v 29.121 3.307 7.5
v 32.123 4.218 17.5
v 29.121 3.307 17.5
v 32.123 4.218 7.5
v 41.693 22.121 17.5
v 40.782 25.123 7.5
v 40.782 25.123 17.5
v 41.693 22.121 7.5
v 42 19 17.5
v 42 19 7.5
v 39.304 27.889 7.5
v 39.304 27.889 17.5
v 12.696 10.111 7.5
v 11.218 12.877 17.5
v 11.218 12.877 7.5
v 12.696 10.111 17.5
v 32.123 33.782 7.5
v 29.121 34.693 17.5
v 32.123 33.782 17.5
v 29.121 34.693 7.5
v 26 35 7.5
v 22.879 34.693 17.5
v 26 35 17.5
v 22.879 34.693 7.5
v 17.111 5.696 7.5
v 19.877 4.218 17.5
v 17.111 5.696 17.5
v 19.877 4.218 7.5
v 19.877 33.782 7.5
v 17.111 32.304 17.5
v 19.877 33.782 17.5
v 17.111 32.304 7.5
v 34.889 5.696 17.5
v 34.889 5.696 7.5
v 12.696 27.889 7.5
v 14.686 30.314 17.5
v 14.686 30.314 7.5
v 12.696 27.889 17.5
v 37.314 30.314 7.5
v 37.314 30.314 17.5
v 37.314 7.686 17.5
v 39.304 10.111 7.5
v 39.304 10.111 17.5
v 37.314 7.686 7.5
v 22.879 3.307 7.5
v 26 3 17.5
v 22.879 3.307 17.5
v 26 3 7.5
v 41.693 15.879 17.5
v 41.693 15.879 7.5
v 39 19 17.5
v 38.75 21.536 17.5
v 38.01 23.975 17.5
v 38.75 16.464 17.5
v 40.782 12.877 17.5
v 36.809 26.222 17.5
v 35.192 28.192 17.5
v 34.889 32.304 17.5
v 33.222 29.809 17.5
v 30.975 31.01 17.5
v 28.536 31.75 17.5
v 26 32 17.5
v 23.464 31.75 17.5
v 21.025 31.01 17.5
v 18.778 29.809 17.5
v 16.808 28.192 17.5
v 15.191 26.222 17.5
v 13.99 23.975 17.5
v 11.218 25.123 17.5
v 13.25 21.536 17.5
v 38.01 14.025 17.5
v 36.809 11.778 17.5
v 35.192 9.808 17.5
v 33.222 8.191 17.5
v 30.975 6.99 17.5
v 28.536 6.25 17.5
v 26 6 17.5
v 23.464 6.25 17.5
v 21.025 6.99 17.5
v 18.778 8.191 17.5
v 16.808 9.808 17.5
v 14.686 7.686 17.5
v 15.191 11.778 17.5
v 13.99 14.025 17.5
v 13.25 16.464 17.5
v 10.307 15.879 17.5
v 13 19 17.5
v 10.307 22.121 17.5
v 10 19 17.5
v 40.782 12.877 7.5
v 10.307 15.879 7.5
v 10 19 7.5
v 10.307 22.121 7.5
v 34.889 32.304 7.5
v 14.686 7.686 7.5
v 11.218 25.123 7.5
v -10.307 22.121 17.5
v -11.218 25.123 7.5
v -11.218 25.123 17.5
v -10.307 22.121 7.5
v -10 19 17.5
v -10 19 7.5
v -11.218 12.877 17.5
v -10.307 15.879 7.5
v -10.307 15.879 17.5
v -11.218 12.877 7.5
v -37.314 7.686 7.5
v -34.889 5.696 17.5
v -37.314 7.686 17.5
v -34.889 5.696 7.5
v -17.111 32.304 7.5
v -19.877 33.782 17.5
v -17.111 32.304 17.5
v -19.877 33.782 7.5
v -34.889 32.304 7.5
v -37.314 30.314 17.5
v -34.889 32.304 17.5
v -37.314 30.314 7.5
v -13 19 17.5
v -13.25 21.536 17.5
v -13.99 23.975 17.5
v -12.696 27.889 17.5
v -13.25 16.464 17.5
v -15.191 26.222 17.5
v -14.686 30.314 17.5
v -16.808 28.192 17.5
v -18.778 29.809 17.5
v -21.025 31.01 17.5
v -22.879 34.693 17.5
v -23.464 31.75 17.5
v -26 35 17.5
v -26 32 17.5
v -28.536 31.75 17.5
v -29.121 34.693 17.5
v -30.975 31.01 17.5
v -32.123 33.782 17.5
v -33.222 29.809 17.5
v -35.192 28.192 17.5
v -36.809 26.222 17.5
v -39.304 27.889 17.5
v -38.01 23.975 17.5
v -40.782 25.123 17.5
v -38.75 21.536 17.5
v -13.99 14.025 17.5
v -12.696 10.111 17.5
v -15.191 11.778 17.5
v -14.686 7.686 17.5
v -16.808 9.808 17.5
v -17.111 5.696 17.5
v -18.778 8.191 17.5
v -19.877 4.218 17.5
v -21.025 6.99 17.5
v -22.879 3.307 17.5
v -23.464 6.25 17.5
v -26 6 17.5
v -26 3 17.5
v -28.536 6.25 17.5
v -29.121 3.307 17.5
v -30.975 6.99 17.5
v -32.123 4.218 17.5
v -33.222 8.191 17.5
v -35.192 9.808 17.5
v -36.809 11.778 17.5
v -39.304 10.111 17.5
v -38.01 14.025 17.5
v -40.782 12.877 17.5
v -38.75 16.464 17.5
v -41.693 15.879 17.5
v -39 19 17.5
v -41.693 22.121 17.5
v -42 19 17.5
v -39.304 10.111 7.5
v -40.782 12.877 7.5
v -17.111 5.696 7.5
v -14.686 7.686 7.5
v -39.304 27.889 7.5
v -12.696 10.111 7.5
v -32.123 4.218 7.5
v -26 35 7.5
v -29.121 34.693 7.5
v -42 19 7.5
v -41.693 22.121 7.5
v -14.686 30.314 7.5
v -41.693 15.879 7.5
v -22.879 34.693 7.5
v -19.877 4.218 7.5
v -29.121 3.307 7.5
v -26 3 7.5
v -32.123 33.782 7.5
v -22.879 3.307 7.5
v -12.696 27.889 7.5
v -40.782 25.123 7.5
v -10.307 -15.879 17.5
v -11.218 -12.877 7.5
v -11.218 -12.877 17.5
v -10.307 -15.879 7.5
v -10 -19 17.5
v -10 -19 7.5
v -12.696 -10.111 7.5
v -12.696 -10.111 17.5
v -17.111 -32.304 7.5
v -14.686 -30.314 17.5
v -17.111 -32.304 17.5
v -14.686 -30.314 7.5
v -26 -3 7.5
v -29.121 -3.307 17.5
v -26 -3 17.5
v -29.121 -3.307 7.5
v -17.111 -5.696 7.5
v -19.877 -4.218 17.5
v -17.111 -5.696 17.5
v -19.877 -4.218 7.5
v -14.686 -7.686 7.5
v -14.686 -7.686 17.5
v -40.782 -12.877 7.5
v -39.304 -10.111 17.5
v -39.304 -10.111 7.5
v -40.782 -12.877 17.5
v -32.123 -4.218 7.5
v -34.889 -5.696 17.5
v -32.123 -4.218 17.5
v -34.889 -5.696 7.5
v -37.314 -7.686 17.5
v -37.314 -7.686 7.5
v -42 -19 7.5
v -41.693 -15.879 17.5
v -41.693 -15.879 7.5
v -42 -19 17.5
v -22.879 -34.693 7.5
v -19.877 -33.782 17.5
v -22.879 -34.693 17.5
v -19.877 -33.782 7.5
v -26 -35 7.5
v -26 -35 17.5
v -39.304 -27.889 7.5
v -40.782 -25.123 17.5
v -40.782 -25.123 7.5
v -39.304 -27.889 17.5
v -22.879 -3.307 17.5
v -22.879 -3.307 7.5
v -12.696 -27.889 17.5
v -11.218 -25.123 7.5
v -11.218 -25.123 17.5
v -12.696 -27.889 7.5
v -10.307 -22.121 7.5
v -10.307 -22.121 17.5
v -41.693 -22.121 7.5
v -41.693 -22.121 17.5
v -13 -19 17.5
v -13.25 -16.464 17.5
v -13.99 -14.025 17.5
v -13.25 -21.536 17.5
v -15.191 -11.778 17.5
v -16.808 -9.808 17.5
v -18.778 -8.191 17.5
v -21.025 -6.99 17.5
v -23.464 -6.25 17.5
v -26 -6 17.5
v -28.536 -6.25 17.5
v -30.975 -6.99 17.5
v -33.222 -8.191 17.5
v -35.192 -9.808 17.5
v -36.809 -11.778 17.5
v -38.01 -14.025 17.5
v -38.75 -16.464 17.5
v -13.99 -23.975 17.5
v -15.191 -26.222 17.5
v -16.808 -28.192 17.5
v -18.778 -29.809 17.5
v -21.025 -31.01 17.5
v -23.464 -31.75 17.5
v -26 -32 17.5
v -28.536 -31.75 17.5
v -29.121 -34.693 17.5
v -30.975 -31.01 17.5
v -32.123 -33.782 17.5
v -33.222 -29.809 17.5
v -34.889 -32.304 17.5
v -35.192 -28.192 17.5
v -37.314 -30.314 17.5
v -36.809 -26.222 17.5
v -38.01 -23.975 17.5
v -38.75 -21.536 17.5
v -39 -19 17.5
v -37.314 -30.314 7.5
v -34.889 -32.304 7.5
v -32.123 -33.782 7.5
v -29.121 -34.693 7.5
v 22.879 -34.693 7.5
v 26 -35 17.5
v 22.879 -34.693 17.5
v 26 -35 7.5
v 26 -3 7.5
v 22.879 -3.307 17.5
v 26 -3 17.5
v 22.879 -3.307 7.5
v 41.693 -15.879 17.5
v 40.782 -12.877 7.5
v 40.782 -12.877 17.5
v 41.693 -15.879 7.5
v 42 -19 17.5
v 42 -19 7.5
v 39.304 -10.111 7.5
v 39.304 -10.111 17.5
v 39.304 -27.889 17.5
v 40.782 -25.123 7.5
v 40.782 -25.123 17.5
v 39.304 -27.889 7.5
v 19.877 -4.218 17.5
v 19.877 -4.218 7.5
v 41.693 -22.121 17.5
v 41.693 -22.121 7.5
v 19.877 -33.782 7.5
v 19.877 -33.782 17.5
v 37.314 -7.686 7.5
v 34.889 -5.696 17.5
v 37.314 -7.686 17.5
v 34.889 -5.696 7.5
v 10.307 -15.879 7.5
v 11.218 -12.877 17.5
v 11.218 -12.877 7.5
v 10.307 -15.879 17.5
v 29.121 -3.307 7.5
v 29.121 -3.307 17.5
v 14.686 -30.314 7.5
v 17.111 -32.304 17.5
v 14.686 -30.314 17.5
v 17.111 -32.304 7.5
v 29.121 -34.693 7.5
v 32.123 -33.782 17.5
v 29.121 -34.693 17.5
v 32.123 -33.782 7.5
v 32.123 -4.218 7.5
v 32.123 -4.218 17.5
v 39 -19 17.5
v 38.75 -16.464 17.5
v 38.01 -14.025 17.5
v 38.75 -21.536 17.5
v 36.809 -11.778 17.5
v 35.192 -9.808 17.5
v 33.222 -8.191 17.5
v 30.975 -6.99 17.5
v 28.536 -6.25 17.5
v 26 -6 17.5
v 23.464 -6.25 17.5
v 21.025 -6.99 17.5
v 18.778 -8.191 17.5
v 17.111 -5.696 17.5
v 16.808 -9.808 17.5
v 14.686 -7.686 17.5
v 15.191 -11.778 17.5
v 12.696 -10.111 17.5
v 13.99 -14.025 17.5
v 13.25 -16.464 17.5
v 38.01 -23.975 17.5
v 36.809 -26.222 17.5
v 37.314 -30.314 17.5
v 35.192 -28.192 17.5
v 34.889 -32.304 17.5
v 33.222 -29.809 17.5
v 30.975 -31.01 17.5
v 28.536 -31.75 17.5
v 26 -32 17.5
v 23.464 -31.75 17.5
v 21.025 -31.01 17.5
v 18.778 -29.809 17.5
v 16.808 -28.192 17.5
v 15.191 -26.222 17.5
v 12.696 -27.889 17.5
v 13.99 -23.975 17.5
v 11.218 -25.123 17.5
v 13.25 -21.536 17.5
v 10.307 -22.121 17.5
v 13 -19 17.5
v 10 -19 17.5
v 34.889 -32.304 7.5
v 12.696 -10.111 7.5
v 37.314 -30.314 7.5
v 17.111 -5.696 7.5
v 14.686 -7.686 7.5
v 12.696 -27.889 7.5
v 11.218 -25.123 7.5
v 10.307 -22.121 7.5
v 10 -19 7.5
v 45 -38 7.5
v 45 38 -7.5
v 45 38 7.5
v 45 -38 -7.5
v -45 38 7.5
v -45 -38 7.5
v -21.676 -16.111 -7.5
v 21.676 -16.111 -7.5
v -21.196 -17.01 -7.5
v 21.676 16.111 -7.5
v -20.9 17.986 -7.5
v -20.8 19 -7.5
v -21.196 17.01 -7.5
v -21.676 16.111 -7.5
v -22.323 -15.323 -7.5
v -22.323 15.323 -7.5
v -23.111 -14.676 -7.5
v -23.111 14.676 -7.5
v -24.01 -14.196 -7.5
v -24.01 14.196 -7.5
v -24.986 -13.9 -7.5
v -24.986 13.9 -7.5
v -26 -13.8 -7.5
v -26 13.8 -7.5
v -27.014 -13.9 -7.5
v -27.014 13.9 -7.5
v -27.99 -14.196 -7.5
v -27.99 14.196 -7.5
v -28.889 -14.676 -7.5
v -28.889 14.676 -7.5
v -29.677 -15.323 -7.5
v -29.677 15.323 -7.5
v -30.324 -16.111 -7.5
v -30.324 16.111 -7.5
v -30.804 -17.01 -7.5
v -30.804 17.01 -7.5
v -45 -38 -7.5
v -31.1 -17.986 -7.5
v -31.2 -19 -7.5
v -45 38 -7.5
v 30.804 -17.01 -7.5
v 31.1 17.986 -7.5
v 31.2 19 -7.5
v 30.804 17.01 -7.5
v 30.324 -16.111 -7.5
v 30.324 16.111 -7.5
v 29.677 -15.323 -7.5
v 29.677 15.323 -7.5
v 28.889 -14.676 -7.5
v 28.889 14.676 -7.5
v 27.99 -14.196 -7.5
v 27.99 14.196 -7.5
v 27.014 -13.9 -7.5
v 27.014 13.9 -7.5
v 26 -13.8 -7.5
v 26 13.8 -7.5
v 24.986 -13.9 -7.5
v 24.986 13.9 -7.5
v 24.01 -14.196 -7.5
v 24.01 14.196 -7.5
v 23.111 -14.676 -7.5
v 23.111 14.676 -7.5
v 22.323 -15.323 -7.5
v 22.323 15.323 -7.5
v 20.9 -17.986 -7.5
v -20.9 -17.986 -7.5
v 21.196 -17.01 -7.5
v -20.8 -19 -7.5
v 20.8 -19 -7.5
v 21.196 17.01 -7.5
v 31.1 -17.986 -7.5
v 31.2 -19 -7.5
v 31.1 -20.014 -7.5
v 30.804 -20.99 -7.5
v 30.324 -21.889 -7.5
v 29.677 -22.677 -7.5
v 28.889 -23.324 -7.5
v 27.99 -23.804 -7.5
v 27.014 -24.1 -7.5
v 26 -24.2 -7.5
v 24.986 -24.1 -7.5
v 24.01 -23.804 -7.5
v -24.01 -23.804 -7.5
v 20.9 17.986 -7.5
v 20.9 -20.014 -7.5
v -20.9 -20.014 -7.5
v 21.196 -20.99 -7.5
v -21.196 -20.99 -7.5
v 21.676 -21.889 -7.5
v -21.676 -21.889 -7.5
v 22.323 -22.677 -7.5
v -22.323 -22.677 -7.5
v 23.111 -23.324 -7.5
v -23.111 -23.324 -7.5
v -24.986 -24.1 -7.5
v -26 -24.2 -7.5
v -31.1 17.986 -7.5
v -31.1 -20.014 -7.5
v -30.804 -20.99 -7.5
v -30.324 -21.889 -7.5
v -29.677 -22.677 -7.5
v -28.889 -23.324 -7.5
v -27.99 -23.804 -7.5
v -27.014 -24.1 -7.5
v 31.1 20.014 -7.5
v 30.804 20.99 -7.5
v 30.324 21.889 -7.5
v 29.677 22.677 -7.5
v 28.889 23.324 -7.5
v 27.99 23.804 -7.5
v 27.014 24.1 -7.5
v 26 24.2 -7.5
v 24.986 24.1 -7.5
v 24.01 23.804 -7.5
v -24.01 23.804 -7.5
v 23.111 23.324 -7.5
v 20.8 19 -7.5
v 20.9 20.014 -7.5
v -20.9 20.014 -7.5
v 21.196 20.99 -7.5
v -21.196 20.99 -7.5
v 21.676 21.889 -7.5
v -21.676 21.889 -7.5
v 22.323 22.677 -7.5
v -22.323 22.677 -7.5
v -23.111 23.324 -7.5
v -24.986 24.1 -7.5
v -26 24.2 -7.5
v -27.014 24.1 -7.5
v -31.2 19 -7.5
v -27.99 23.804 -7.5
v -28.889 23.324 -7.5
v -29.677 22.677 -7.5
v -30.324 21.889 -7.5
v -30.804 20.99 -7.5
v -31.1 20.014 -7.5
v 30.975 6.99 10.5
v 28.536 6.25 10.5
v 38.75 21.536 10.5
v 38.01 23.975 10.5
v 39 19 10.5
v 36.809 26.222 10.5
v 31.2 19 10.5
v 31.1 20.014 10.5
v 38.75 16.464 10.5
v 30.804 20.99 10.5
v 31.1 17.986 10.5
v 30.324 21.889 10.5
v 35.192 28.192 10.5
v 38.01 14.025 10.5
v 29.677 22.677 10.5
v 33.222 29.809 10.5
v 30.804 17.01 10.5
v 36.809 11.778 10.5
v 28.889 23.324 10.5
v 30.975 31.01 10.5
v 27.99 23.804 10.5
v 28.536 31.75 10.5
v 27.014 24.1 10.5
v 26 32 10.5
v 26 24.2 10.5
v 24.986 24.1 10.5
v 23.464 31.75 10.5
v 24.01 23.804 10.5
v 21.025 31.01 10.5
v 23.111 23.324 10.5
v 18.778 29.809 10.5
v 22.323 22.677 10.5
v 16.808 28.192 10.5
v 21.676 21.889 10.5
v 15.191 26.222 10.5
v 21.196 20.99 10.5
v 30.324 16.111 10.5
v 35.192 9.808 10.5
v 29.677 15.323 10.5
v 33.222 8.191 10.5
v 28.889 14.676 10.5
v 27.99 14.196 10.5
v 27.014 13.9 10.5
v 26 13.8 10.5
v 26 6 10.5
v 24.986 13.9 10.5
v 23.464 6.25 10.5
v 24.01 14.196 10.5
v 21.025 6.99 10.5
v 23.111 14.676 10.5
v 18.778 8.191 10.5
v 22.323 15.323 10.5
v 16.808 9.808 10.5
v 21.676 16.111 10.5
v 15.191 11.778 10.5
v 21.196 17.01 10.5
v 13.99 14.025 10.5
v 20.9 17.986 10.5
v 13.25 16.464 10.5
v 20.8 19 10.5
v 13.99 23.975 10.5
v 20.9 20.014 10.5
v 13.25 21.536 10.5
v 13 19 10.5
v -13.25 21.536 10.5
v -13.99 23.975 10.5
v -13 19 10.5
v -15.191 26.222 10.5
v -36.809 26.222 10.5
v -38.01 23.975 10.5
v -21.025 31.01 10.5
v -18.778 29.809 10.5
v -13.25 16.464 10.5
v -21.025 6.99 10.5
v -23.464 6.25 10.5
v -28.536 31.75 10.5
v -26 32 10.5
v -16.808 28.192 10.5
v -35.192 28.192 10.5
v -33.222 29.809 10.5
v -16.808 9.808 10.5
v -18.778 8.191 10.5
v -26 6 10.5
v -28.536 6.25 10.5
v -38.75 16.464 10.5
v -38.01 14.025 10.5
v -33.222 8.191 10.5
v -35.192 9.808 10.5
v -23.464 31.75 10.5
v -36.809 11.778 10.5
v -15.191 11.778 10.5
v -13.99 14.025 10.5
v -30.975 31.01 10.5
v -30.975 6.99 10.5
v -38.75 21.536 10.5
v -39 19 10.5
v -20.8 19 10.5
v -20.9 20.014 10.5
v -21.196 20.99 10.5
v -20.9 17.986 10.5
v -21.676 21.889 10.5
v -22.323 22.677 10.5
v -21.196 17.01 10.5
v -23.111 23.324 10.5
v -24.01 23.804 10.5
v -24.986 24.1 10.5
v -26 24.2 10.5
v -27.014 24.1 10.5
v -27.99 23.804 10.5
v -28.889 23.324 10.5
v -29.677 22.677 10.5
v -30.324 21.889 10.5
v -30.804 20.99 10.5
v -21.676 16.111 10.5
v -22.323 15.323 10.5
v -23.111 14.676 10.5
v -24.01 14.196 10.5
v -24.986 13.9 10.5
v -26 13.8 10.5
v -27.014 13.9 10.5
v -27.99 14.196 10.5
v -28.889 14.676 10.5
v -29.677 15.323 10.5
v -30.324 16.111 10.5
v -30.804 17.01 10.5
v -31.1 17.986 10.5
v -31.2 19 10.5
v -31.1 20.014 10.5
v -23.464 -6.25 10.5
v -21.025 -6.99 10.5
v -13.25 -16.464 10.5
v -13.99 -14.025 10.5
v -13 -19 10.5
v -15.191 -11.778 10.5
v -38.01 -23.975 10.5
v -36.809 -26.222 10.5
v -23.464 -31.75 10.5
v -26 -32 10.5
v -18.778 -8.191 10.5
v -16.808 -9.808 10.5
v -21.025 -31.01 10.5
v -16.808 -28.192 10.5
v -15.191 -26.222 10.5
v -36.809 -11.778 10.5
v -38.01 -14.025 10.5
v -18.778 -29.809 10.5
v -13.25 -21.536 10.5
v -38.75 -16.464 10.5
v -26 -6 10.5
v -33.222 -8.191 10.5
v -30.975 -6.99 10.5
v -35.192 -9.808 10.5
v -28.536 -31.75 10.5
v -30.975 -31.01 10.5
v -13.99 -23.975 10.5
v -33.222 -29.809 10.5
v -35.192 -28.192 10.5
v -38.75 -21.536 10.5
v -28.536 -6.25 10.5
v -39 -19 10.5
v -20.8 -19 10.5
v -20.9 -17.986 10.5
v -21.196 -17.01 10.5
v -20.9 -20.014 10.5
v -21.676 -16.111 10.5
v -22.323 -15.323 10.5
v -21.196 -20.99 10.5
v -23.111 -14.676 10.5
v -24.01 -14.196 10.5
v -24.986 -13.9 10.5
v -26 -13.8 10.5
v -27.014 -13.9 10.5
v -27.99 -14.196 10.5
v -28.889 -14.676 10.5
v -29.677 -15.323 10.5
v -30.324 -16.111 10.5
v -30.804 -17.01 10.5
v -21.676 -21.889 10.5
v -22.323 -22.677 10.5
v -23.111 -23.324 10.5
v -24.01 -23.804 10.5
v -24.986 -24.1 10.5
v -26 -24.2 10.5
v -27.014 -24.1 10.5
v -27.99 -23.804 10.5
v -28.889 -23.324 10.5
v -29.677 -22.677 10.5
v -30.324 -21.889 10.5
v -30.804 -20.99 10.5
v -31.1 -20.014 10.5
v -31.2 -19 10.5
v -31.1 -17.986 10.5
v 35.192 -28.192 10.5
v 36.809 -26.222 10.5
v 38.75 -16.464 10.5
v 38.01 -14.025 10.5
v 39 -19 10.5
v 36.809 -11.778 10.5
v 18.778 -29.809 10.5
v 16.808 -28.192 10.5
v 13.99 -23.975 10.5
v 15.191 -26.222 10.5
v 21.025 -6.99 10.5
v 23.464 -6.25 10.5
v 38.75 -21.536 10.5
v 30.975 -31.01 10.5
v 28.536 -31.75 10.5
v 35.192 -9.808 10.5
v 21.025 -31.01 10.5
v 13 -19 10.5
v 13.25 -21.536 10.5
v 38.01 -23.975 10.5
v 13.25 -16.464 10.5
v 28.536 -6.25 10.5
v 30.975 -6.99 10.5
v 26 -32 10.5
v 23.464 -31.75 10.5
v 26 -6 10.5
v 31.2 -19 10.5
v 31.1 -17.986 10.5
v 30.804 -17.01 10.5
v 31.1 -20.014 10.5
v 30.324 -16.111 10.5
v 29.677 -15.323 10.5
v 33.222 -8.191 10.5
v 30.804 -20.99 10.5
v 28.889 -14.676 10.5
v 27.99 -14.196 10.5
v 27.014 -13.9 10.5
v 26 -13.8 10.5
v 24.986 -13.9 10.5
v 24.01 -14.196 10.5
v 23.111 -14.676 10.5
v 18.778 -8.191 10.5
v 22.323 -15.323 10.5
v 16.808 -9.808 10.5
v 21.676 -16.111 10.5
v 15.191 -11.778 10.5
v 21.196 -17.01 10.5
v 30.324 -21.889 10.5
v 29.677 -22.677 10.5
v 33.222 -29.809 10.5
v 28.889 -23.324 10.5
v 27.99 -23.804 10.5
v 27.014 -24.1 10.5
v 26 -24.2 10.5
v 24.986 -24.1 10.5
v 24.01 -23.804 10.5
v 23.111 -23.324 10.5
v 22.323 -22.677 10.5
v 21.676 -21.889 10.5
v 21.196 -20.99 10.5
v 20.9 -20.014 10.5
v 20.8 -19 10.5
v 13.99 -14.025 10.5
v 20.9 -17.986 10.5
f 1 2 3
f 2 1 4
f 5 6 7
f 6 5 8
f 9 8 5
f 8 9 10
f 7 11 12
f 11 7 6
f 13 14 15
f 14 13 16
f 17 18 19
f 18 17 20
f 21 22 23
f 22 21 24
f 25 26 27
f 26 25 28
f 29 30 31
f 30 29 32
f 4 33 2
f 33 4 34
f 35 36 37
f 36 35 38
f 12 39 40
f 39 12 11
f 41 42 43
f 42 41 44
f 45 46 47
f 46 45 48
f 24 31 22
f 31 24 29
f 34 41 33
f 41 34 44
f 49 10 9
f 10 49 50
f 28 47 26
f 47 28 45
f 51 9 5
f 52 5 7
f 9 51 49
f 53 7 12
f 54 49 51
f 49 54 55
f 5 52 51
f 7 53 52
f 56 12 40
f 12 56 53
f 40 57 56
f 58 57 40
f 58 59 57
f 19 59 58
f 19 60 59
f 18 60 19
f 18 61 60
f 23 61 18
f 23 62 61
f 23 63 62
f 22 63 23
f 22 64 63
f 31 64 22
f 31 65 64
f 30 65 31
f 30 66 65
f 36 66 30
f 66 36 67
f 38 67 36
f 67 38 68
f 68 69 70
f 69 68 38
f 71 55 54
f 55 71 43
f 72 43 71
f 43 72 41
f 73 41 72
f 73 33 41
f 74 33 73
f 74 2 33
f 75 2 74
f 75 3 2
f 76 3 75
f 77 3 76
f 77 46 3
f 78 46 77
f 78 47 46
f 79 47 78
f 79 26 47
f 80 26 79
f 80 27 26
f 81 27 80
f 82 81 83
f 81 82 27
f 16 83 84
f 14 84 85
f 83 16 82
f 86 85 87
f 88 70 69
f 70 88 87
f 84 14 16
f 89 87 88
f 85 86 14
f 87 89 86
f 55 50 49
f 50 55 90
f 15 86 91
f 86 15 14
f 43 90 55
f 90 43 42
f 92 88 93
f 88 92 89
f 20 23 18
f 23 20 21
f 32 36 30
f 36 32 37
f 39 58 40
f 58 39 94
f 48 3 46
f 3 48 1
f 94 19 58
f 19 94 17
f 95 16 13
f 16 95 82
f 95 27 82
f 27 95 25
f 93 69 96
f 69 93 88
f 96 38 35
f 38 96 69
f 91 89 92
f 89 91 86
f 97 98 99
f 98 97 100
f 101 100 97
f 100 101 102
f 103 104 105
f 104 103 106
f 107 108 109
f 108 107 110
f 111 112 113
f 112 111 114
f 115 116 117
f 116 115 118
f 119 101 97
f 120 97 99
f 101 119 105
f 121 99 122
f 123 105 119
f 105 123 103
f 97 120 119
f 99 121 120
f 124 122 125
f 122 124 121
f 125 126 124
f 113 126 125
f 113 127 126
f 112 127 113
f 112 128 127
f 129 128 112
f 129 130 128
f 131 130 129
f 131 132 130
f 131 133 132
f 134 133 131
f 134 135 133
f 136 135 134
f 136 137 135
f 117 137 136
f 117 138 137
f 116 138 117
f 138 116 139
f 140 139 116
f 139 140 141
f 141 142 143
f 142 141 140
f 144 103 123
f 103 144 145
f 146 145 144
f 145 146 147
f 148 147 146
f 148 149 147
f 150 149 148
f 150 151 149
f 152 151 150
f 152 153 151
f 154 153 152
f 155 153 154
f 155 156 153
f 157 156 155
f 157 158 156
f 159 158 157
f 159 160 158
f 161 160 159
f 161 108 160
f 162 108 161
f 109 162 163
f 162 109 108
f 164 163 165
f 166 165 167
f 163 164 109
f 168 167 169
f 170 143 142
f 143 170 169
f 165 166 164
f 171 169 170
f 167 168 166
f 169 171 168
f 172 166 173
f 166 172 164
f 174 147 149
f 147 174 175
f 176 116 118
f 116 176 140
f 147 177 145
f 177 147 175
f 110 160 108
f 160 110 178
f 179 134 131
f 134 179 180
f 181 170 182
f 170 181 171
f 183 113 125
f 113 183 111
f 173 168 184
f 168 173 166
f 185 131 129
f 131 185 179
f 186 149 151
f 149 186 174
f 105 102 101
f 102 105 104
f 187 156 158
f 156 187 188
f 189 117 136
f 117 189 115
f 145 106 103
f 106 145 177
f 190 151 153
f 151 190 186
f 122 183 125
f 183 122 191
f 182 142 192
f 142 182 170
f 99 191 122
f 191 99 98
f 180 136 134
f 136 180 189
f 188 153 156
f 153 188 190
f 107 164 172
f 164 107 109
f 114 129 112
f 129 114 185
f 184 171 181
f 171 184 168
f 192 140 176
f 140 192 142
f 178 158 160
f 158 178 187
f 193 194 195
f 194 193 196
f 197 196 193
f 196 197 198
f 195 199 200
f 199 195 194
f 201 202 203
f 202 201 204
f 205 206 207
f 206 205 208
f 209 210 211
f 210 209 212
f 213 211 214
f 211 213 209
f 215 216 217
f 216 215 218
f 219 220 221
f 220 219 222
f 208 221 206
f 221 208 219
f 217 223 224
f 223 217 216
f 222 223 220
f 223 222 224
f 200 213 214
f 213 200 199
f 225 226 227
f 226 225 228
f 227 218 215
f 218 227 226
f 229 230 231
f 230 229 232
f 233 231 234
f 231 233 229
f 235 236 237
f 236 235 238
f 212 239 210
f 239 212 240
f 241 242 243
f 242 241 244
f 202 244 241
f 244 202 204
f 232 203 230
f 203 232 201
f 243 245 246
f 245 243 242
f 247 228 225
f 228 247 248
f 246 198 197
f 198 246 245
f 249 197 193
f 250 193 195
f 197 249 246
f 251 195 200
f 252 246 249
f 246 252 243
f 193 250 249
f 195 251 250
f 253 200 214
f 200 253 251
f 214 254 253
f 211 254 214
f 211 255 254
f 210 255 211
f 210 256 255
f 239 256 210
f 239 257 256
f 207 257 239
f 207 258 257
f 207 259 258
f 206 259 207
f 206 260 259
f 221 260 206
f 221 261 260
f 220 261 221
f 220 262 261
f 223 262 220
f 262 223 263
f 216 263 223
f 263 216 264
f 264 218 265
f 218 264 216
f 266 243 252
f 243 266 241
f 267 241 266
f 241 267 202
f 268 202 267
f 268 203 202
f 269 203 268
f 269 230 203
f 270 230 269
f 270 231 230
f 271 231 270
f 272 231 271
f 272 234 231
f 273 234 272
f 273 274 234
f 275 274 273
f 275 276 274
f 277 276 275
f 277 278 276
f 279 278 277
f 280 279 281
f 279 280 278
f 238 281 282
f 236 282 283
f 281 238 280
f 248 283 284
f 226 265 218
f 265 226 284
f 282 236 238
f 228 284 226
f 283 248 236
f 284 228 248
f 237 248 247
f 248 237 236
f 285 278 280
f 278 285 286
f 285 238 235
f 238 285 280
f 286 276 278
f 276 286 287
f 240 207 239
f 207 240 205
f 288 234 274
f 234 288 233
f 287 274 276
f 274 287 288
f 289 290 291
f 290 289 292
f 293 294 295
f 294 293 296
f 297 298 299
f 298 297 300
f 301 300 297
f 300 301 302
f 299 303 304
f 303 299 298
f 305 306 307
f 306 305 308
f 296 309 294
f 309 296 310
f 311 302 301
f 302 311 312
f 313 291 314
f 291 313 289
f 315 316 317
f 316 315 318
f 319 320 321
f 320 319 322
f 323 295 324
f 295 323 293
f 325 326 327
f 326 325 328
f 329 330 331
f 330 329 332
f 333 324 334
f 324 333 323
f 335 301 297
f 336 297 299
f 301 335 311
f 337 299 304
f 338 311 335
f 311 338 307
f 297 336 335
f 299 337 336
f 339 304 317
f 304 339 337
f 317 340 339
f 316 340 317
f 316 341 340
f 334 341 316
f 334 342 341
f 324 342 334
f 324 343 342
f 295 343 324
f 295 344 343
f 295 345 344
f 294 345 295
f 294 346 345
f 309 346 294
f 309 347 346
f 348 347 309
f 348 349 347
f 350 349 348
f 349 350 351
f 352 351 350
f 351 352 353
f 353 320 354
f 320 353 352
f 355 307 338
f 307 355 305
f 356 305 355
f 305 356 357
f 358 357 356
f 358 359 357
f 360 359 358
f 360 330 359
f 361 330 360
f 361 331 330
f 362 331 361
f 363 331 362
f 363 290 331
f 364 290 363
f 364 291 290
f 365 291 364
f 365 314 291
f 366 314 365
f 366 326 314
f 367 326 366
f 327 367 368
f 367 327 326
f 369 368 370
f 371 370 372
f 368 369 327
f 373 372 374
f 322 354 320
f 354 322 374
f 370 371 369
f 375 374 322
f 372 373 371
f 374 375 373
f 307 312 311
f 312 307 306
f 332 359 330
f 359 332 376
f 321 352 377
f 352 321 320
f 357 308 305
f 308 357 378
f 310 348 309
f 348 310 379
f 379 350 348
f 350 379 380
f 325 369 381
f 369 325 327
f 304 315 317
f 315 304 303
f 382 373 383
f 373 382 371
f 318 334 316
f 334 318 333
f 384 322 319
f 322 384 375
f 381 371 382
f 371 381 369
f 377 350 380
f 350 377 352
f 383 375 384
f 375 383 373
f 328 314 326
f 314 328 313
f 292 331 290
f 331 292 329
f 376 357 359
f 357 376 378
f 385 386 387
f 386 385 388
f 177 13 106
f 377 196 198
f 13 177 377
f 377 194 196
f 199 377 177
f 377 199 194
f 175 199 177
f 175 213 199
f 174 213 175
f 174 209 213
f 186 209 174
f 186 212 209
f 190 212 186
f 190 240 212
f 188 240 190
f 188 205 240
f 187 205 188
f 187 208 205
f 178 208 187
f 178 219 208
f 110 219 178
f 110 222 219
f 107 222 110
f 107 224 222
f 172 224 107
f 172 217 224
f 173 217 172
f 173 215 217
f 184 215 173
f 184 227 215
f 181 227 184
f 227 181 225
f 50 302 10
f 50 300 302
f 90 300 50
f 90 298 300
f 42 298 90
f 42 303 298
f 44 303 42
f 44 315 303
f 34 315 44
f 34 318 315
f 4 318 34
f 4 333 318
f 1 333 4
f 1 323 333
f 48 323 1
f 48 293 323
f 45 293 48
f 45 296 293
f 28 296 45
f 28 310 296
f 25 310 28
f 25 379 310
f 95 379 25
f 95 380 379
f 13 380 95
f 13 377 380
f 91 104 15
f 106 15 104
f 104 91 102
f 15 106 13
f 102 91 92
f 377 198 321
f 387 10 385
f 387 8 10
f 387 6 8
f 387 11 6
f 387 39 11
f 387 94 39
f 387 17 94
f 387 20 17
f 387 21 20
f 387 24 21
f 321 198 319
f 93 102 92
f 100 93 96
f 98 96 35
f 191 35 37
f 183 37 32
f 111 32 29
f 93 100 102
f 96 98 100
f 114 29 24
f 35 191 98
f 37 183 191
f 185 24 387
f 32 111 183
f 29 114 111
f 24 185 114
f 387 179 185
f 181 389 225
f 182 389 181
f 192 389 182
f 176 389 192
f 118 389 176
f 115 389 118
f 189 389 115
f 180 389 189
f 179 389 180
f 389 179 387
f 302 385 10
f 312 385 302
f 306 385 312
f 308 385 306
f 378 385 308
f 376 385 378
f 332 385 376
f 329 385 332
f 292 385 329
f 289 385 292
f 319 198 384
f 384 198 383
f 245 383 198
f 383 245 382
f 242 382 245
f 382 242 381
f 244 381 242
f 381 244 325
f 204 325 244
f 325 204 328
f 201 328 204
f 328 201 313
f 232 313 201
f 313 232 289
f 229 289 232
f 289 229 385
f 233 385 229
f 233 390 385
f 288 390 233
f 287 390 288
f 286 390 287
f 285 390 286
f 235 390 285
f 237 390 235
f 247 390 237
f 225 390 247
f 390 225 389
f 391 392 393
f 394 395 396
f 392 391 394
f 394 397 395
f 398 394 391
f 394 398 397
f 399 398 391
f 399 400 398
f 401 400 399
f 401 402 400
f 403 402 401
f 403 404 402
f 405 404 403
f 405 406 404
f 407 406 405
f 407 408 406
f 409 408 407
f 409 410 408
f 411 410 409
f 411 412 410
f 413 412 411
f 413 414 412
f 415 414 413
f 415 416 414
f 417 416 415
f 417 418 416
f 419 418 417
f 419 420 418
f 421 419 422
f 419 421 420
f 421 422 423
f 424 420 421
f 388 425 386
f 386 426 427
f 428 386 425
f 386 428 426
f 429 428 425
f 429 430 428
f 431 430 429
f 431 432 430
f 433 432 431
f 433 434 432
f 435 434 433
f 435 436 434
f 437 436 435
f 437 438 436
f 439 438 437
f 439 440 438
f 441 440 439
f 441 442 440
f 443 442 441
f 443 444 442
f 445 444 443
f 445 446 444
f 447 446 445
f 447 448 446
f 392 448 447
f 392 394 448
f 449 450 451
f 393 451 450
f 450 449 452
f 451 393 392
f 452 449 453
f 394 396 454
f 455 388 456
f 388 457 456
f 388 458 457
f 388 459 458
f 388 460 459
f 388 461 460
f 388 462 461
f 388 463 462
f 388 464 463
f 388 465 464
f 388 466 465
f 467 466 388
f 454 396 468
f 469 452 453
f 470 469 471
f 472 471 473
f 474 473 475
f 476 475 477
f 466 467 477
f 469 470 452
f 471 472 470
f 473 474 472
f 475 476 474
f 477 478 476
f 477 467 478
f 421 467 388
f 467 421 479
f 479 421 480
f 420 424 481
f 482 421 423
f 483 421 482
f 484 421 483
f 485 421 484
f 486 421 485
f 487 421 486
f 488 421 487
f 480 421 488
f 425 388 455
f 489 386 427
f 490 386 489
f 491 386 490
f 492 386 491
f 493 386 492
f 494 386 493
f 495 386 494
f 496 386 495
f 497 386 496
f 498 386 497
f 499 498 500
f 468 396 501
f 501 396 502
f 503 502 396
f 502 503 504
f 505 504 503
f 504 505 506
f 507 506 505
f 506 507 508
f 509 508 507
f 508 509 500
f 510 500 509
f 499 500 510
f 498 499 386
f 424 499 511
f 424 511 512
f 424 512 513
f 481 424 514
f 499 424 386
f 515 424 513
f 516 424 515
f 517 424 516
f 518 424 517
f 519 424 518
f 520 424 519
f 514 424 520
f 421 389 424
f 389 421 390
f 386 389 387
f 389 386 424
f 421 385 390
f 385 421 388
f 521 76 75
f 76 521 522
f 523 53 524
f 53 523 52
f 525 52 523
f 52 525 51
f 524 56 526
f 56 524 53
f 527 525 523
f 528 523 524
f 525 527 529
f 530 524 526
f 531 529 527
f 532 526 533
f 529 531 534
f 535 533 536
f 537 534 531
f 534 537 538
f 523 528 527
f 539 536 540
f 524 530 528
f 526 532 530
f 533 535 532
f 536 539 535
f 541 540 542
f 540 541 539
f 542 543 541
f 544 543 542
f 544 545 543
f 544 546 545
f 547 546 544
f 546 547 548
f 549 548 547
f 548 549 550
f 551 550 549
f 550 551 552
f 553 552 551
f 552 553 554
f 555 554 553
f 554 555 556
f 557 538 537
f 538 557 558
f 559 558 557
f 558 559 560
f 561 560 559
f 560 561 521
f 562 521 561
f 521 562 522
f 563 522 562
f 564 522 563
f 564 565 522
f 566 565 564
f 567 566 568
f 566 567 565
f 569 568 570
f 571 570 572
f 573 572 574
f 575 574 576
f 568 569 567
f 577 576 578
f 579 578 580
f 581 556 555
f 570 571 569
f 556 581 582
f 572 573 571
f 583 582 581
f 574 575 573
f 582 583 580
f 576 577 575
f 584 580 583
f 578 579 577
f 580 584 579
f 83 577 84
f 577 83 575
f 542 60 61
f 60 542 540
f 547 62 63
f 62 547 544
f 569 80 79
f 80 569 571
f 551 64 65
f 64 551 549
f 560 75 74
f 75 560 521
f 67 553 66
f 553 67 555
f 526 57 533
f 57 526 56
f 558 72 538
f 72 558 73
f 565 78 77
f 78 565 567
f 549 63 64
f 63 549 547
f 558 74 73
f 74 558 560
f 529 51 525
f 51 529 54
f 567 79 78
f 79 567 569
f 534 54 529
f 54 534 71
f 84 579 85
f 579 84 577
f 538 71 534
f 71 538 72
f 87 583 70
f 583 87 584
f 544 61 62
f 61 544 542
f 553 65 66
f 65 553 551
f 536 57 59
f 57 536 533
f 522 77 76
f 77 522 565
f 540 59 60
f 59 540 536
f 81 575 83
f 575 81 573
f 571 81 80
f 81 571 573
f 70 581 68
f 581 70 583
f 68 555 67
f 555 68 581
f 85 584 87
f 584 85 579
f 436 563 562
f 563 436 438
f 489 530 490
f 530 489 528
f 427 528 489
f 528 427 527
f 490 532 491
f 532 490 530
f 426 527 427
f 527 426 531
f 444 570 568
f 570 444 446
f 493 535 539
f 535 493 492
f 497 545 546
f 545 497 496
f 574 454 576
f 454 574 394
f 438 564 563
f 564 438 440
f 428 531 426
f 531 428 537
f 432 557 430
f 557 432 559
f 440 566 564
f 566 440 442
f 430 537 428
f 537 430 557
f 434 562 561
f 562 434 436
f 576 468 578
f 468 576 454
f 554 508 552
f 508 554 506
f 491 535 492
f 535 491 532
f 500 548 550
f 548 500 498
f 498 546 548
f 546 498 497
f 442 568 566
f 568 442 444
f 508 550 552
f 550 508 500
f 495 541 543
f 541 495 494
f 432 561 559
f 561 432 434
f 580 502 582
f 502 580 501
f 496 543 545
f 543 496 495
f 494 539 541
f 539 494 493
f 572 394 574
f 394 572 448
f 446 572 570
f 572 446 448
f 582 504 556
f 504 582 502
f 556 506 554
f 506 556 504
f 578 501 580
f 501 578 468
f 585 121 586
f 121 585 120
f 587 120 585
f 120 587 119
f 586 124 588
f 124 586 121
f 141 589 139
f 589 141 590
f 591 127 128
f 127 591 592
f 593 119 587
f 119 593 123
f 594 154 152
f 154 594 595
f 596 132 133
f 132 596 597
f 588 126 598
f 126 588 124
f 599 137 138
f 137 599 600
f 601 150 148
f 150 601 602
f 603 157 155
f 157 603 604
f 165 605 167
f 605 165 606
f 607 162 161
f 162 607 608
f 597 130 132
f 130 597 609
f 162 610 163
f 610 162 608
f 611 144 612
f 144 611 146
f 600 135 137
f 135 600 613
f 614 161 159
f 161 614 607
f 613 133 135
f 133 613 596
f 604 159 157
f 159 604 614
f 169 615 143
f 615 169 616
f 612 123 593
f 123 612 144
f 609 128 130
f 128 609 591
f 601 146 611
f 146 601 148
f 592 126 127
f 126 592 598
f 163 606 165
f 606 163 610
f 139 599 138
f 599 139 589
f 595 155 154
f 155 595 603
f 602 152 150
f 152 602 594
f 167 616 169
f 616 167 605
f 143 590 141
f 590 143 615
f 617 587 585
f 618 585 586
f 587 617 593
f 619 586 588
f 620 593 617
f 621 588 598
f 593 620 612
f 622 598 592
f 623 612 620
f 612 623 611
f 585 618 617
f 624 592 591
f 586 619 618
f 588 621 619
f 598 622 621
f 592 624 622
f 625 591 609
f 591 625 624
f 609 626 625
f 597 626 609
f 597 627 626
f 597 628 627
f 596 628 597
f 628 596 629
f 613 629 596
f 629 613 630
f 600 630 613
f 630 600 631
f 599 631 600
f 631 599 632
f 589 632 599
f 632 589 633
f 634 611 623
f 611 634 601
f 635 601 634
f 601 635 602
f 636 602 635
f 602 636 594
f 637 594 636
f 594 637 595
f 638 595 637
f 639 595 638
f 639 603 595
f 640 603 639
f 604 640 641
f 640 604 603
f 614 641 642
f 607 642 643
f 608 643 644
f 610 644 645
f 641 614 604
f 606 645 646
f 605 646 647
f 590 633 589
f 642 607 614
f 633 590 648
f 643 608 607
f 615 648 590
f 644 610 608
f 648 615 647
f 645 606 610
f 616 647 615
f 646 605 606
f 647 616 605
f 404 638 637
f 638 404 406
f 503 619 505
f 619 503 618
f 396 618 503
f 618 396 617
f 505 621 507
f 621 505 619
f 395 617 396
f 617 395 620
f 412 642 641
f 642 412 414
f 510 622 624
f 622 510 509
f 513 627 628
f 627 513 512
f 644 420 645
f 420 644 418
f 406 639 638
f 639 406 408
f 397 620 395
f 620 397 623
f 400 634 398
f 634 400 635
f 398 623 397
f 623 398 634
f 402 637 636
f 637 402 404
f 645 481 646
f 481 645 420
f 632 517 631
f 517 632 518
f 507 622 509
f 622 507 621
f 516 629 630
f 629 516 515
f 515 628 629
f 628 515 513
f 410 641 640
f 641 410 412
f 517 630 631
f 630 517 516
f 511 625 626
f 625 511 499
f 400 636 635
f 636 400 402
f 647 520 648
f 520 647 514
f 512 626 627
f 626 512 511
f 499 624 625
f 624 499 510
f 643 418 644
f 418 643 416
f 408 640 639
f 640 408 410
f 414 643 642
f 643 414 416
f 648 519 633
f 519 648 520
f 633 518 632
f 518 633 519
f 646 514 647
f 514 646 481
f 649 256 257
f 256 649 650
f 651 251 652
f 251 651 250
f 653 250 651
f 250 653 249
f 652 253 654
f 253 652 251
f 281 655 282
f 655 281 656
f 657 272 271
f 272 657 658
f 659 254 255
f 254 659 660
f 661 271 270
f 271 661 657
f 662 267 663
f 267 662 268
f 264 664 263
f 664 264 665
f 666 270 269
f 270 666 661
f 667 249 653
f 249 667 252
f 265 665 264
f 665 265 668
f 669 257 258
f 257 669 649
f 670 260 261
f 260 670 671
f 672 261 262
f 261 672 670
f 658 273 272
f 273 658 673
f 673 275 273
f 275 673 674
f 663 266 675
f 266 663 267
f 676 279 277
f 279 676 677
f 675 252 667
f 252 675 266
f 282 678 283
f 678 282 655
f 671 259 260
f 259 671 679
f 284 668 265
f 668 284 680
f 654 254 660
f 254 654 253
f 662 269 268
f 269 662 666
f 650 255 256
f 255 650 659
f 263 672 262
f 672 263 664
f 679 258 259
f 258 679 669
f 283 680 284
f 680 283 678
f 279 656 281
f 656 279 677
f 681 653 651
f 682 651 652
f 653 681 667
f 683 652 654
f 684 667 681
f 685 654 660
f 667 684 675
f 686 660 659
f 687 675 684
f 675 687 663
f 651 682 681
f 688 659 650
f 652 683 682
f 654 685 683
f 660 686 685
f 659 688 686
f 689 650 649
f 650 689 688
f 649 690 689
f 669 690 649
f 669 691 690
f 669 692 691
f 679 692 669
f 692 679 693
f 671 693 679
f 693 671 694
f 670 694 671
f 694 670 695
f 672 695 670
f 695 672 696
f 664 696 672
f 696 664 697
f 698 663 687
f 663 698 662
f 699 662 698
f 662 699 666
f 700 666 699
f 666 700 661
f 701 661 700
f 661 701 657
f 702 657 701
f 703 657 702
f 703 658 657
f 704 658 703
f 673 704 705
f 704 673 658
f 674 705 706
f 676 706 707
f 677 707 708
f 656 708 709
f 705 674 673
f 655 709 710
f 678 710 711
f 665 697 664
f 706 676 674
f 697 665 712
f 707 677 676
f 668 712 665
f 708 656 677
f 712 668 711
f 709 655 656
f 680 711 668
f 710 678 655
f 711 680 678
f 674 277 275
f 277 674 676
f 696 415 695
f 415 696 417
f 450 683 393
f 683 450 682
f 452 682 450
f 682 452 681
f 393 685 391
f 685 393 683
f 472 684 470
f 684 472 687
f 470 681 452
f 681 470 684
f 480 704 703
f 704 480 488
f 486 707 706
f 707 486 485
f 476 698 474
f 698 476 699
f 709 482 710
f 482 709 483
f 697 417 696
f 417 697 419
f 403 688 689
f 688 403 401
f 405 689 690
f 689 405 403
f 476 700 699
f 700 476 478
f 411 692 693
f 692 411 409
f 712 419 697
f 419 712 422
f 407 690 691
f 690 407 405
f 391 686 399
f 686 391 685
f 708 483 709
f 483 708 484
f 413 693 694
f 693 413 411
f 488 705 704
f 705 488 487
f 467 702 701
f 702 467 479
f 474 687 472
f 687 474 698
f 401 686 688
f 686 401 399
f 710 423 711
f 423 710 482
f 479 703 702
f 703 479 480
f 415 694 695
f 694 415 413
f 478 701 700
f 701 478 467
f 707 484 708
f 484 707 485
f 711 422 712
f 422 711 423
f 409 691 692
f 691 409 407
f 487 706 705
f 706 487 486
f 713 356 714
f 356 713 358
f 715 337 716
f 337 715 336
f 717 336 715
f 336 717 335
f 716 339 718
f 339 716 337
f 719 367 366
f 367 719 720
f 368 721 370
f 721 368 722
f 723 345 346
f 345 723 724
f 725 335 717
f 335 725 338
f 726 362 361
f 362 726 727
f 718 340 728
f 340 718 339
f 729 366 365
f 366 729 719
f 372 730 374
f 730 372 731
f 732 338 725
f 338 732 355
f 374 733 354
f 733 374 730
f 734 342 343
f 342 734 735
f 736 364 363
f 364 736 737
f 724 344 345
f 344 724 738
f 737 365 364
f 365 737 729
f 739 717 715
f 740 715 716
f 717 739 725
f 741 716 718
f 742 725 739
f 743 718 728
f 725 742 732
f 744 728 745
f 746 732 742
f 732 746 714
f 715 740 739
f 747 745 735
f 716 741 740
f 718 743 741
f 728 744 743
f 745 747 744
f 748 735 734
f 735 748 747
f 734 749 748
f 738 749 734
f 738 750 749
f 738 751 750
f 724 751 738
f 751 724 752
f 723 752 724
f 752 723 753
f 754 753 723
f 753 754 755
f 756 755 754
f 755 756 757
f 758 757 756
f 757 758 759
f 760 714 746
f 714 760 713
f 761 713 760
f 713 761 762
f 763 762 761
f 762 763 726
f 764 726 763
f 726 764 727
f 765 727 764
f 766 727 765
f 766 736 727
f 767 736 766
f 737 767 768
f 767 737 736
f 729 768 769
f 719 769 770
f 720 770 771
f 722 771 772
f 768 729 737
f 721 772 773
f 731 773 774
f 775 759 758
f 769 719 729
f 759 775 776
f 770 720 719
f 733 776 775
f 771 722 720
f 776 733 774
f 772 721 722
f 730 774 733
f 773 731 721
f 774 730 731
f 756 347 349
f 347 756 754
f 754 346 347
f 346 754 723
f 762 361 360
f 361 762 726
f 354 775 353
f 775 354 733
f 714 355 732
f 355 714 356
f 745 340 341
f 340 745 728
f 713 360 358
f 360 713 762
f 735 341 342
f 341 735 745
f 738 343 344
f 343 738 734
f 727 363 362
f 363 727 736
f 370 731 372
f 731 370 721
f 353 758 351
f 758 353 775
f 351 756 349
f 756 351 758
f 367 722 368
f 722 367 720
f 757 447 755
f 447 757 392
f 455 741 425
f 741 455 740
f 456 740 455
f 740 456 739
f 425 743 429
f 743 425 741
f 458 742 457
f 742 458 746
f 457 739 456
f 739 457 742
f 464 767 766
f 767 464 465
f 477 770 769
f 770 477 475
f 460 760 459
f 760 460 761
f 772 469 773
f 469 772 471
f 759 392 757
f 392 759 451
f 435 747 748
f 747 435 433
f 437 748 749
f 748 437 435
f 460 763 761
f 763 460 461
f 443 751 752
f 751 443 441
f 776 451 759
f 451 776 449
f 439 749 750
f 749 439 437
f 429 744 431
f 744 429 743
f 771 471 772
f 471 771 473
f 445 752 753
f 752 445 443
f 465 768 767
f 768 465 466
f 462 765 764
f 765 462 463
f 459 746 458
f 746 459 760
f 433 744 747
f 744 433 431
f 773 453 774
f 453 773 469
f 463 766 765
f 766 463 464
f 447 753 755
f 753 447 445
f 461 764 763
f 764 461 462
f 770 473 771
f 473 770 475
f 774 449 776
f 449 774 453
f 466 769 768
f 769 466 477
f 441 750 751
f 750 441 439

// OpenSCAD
$fn = 32;

// ----------------------------------------------------------------------
// Socket pad plate
// bosses with counterbored sockets for the screws
// ----------------------------------------------------------------------

// --- parameters (mm) ---
base_t = 15;           // base plate thickness
seat_tol = 0.1;        // tolerance at the seating features
free_tol = 0.5;        // general tolerance on the free sizes
boss_h = 10;           // boss height above the base plate
boss_d = 32;           // boss diameter
socket_d = 26;         // socket diameter
socket_depth = 7;      // socket depth from the boss face
bolt_d = 10.4;         // screw clearance hole through the socket floor
plate = [90, 76, 15];  // overall size (x, y, z)
edge = 19;             // boss centre offset from the plate edge
pads = 4;              // boss count, one per corner

// --- derived feature positions (mm) ---
height = base_t + boss_h;        // = 25   overall height of the part
corner_x = plate[0] / 2 - edge;  // = 26   boss centre X
corner_y = plate[1] / 2 - edge;  // = 19   boss centre Y
feature_centers = [
  [corner_x, corner_y],
  [-corner_x, corner_y],
  [-corner_x, -corner_y],
  [corner_x, -corner_y]
];   // boss centres: sockets, holes and the pads themselves are placed from here

// base plate, bosses on feature_centers, socket + through hole in each
difference() {
  union() {
    cube(plate, center = true);
    for (centre = feature_centers)
      translate([centre[0], centre[1], plate[2] / 2 - 1])
        cylinder(d = boss_d, h = boss_h + 1);
  }
  for (centre = feature_centers) {
    translate([centre[0], centre[1], plate[2] / 2 + boss_h - socket_depth])
      cylinder(d = socket_d, h = socket_depth + 1);
    translate([centre[0], centre[1], -height])
      cylinder(d = bolt_d, h = 2 * height + 2);  // through the socket floor
  }
}
